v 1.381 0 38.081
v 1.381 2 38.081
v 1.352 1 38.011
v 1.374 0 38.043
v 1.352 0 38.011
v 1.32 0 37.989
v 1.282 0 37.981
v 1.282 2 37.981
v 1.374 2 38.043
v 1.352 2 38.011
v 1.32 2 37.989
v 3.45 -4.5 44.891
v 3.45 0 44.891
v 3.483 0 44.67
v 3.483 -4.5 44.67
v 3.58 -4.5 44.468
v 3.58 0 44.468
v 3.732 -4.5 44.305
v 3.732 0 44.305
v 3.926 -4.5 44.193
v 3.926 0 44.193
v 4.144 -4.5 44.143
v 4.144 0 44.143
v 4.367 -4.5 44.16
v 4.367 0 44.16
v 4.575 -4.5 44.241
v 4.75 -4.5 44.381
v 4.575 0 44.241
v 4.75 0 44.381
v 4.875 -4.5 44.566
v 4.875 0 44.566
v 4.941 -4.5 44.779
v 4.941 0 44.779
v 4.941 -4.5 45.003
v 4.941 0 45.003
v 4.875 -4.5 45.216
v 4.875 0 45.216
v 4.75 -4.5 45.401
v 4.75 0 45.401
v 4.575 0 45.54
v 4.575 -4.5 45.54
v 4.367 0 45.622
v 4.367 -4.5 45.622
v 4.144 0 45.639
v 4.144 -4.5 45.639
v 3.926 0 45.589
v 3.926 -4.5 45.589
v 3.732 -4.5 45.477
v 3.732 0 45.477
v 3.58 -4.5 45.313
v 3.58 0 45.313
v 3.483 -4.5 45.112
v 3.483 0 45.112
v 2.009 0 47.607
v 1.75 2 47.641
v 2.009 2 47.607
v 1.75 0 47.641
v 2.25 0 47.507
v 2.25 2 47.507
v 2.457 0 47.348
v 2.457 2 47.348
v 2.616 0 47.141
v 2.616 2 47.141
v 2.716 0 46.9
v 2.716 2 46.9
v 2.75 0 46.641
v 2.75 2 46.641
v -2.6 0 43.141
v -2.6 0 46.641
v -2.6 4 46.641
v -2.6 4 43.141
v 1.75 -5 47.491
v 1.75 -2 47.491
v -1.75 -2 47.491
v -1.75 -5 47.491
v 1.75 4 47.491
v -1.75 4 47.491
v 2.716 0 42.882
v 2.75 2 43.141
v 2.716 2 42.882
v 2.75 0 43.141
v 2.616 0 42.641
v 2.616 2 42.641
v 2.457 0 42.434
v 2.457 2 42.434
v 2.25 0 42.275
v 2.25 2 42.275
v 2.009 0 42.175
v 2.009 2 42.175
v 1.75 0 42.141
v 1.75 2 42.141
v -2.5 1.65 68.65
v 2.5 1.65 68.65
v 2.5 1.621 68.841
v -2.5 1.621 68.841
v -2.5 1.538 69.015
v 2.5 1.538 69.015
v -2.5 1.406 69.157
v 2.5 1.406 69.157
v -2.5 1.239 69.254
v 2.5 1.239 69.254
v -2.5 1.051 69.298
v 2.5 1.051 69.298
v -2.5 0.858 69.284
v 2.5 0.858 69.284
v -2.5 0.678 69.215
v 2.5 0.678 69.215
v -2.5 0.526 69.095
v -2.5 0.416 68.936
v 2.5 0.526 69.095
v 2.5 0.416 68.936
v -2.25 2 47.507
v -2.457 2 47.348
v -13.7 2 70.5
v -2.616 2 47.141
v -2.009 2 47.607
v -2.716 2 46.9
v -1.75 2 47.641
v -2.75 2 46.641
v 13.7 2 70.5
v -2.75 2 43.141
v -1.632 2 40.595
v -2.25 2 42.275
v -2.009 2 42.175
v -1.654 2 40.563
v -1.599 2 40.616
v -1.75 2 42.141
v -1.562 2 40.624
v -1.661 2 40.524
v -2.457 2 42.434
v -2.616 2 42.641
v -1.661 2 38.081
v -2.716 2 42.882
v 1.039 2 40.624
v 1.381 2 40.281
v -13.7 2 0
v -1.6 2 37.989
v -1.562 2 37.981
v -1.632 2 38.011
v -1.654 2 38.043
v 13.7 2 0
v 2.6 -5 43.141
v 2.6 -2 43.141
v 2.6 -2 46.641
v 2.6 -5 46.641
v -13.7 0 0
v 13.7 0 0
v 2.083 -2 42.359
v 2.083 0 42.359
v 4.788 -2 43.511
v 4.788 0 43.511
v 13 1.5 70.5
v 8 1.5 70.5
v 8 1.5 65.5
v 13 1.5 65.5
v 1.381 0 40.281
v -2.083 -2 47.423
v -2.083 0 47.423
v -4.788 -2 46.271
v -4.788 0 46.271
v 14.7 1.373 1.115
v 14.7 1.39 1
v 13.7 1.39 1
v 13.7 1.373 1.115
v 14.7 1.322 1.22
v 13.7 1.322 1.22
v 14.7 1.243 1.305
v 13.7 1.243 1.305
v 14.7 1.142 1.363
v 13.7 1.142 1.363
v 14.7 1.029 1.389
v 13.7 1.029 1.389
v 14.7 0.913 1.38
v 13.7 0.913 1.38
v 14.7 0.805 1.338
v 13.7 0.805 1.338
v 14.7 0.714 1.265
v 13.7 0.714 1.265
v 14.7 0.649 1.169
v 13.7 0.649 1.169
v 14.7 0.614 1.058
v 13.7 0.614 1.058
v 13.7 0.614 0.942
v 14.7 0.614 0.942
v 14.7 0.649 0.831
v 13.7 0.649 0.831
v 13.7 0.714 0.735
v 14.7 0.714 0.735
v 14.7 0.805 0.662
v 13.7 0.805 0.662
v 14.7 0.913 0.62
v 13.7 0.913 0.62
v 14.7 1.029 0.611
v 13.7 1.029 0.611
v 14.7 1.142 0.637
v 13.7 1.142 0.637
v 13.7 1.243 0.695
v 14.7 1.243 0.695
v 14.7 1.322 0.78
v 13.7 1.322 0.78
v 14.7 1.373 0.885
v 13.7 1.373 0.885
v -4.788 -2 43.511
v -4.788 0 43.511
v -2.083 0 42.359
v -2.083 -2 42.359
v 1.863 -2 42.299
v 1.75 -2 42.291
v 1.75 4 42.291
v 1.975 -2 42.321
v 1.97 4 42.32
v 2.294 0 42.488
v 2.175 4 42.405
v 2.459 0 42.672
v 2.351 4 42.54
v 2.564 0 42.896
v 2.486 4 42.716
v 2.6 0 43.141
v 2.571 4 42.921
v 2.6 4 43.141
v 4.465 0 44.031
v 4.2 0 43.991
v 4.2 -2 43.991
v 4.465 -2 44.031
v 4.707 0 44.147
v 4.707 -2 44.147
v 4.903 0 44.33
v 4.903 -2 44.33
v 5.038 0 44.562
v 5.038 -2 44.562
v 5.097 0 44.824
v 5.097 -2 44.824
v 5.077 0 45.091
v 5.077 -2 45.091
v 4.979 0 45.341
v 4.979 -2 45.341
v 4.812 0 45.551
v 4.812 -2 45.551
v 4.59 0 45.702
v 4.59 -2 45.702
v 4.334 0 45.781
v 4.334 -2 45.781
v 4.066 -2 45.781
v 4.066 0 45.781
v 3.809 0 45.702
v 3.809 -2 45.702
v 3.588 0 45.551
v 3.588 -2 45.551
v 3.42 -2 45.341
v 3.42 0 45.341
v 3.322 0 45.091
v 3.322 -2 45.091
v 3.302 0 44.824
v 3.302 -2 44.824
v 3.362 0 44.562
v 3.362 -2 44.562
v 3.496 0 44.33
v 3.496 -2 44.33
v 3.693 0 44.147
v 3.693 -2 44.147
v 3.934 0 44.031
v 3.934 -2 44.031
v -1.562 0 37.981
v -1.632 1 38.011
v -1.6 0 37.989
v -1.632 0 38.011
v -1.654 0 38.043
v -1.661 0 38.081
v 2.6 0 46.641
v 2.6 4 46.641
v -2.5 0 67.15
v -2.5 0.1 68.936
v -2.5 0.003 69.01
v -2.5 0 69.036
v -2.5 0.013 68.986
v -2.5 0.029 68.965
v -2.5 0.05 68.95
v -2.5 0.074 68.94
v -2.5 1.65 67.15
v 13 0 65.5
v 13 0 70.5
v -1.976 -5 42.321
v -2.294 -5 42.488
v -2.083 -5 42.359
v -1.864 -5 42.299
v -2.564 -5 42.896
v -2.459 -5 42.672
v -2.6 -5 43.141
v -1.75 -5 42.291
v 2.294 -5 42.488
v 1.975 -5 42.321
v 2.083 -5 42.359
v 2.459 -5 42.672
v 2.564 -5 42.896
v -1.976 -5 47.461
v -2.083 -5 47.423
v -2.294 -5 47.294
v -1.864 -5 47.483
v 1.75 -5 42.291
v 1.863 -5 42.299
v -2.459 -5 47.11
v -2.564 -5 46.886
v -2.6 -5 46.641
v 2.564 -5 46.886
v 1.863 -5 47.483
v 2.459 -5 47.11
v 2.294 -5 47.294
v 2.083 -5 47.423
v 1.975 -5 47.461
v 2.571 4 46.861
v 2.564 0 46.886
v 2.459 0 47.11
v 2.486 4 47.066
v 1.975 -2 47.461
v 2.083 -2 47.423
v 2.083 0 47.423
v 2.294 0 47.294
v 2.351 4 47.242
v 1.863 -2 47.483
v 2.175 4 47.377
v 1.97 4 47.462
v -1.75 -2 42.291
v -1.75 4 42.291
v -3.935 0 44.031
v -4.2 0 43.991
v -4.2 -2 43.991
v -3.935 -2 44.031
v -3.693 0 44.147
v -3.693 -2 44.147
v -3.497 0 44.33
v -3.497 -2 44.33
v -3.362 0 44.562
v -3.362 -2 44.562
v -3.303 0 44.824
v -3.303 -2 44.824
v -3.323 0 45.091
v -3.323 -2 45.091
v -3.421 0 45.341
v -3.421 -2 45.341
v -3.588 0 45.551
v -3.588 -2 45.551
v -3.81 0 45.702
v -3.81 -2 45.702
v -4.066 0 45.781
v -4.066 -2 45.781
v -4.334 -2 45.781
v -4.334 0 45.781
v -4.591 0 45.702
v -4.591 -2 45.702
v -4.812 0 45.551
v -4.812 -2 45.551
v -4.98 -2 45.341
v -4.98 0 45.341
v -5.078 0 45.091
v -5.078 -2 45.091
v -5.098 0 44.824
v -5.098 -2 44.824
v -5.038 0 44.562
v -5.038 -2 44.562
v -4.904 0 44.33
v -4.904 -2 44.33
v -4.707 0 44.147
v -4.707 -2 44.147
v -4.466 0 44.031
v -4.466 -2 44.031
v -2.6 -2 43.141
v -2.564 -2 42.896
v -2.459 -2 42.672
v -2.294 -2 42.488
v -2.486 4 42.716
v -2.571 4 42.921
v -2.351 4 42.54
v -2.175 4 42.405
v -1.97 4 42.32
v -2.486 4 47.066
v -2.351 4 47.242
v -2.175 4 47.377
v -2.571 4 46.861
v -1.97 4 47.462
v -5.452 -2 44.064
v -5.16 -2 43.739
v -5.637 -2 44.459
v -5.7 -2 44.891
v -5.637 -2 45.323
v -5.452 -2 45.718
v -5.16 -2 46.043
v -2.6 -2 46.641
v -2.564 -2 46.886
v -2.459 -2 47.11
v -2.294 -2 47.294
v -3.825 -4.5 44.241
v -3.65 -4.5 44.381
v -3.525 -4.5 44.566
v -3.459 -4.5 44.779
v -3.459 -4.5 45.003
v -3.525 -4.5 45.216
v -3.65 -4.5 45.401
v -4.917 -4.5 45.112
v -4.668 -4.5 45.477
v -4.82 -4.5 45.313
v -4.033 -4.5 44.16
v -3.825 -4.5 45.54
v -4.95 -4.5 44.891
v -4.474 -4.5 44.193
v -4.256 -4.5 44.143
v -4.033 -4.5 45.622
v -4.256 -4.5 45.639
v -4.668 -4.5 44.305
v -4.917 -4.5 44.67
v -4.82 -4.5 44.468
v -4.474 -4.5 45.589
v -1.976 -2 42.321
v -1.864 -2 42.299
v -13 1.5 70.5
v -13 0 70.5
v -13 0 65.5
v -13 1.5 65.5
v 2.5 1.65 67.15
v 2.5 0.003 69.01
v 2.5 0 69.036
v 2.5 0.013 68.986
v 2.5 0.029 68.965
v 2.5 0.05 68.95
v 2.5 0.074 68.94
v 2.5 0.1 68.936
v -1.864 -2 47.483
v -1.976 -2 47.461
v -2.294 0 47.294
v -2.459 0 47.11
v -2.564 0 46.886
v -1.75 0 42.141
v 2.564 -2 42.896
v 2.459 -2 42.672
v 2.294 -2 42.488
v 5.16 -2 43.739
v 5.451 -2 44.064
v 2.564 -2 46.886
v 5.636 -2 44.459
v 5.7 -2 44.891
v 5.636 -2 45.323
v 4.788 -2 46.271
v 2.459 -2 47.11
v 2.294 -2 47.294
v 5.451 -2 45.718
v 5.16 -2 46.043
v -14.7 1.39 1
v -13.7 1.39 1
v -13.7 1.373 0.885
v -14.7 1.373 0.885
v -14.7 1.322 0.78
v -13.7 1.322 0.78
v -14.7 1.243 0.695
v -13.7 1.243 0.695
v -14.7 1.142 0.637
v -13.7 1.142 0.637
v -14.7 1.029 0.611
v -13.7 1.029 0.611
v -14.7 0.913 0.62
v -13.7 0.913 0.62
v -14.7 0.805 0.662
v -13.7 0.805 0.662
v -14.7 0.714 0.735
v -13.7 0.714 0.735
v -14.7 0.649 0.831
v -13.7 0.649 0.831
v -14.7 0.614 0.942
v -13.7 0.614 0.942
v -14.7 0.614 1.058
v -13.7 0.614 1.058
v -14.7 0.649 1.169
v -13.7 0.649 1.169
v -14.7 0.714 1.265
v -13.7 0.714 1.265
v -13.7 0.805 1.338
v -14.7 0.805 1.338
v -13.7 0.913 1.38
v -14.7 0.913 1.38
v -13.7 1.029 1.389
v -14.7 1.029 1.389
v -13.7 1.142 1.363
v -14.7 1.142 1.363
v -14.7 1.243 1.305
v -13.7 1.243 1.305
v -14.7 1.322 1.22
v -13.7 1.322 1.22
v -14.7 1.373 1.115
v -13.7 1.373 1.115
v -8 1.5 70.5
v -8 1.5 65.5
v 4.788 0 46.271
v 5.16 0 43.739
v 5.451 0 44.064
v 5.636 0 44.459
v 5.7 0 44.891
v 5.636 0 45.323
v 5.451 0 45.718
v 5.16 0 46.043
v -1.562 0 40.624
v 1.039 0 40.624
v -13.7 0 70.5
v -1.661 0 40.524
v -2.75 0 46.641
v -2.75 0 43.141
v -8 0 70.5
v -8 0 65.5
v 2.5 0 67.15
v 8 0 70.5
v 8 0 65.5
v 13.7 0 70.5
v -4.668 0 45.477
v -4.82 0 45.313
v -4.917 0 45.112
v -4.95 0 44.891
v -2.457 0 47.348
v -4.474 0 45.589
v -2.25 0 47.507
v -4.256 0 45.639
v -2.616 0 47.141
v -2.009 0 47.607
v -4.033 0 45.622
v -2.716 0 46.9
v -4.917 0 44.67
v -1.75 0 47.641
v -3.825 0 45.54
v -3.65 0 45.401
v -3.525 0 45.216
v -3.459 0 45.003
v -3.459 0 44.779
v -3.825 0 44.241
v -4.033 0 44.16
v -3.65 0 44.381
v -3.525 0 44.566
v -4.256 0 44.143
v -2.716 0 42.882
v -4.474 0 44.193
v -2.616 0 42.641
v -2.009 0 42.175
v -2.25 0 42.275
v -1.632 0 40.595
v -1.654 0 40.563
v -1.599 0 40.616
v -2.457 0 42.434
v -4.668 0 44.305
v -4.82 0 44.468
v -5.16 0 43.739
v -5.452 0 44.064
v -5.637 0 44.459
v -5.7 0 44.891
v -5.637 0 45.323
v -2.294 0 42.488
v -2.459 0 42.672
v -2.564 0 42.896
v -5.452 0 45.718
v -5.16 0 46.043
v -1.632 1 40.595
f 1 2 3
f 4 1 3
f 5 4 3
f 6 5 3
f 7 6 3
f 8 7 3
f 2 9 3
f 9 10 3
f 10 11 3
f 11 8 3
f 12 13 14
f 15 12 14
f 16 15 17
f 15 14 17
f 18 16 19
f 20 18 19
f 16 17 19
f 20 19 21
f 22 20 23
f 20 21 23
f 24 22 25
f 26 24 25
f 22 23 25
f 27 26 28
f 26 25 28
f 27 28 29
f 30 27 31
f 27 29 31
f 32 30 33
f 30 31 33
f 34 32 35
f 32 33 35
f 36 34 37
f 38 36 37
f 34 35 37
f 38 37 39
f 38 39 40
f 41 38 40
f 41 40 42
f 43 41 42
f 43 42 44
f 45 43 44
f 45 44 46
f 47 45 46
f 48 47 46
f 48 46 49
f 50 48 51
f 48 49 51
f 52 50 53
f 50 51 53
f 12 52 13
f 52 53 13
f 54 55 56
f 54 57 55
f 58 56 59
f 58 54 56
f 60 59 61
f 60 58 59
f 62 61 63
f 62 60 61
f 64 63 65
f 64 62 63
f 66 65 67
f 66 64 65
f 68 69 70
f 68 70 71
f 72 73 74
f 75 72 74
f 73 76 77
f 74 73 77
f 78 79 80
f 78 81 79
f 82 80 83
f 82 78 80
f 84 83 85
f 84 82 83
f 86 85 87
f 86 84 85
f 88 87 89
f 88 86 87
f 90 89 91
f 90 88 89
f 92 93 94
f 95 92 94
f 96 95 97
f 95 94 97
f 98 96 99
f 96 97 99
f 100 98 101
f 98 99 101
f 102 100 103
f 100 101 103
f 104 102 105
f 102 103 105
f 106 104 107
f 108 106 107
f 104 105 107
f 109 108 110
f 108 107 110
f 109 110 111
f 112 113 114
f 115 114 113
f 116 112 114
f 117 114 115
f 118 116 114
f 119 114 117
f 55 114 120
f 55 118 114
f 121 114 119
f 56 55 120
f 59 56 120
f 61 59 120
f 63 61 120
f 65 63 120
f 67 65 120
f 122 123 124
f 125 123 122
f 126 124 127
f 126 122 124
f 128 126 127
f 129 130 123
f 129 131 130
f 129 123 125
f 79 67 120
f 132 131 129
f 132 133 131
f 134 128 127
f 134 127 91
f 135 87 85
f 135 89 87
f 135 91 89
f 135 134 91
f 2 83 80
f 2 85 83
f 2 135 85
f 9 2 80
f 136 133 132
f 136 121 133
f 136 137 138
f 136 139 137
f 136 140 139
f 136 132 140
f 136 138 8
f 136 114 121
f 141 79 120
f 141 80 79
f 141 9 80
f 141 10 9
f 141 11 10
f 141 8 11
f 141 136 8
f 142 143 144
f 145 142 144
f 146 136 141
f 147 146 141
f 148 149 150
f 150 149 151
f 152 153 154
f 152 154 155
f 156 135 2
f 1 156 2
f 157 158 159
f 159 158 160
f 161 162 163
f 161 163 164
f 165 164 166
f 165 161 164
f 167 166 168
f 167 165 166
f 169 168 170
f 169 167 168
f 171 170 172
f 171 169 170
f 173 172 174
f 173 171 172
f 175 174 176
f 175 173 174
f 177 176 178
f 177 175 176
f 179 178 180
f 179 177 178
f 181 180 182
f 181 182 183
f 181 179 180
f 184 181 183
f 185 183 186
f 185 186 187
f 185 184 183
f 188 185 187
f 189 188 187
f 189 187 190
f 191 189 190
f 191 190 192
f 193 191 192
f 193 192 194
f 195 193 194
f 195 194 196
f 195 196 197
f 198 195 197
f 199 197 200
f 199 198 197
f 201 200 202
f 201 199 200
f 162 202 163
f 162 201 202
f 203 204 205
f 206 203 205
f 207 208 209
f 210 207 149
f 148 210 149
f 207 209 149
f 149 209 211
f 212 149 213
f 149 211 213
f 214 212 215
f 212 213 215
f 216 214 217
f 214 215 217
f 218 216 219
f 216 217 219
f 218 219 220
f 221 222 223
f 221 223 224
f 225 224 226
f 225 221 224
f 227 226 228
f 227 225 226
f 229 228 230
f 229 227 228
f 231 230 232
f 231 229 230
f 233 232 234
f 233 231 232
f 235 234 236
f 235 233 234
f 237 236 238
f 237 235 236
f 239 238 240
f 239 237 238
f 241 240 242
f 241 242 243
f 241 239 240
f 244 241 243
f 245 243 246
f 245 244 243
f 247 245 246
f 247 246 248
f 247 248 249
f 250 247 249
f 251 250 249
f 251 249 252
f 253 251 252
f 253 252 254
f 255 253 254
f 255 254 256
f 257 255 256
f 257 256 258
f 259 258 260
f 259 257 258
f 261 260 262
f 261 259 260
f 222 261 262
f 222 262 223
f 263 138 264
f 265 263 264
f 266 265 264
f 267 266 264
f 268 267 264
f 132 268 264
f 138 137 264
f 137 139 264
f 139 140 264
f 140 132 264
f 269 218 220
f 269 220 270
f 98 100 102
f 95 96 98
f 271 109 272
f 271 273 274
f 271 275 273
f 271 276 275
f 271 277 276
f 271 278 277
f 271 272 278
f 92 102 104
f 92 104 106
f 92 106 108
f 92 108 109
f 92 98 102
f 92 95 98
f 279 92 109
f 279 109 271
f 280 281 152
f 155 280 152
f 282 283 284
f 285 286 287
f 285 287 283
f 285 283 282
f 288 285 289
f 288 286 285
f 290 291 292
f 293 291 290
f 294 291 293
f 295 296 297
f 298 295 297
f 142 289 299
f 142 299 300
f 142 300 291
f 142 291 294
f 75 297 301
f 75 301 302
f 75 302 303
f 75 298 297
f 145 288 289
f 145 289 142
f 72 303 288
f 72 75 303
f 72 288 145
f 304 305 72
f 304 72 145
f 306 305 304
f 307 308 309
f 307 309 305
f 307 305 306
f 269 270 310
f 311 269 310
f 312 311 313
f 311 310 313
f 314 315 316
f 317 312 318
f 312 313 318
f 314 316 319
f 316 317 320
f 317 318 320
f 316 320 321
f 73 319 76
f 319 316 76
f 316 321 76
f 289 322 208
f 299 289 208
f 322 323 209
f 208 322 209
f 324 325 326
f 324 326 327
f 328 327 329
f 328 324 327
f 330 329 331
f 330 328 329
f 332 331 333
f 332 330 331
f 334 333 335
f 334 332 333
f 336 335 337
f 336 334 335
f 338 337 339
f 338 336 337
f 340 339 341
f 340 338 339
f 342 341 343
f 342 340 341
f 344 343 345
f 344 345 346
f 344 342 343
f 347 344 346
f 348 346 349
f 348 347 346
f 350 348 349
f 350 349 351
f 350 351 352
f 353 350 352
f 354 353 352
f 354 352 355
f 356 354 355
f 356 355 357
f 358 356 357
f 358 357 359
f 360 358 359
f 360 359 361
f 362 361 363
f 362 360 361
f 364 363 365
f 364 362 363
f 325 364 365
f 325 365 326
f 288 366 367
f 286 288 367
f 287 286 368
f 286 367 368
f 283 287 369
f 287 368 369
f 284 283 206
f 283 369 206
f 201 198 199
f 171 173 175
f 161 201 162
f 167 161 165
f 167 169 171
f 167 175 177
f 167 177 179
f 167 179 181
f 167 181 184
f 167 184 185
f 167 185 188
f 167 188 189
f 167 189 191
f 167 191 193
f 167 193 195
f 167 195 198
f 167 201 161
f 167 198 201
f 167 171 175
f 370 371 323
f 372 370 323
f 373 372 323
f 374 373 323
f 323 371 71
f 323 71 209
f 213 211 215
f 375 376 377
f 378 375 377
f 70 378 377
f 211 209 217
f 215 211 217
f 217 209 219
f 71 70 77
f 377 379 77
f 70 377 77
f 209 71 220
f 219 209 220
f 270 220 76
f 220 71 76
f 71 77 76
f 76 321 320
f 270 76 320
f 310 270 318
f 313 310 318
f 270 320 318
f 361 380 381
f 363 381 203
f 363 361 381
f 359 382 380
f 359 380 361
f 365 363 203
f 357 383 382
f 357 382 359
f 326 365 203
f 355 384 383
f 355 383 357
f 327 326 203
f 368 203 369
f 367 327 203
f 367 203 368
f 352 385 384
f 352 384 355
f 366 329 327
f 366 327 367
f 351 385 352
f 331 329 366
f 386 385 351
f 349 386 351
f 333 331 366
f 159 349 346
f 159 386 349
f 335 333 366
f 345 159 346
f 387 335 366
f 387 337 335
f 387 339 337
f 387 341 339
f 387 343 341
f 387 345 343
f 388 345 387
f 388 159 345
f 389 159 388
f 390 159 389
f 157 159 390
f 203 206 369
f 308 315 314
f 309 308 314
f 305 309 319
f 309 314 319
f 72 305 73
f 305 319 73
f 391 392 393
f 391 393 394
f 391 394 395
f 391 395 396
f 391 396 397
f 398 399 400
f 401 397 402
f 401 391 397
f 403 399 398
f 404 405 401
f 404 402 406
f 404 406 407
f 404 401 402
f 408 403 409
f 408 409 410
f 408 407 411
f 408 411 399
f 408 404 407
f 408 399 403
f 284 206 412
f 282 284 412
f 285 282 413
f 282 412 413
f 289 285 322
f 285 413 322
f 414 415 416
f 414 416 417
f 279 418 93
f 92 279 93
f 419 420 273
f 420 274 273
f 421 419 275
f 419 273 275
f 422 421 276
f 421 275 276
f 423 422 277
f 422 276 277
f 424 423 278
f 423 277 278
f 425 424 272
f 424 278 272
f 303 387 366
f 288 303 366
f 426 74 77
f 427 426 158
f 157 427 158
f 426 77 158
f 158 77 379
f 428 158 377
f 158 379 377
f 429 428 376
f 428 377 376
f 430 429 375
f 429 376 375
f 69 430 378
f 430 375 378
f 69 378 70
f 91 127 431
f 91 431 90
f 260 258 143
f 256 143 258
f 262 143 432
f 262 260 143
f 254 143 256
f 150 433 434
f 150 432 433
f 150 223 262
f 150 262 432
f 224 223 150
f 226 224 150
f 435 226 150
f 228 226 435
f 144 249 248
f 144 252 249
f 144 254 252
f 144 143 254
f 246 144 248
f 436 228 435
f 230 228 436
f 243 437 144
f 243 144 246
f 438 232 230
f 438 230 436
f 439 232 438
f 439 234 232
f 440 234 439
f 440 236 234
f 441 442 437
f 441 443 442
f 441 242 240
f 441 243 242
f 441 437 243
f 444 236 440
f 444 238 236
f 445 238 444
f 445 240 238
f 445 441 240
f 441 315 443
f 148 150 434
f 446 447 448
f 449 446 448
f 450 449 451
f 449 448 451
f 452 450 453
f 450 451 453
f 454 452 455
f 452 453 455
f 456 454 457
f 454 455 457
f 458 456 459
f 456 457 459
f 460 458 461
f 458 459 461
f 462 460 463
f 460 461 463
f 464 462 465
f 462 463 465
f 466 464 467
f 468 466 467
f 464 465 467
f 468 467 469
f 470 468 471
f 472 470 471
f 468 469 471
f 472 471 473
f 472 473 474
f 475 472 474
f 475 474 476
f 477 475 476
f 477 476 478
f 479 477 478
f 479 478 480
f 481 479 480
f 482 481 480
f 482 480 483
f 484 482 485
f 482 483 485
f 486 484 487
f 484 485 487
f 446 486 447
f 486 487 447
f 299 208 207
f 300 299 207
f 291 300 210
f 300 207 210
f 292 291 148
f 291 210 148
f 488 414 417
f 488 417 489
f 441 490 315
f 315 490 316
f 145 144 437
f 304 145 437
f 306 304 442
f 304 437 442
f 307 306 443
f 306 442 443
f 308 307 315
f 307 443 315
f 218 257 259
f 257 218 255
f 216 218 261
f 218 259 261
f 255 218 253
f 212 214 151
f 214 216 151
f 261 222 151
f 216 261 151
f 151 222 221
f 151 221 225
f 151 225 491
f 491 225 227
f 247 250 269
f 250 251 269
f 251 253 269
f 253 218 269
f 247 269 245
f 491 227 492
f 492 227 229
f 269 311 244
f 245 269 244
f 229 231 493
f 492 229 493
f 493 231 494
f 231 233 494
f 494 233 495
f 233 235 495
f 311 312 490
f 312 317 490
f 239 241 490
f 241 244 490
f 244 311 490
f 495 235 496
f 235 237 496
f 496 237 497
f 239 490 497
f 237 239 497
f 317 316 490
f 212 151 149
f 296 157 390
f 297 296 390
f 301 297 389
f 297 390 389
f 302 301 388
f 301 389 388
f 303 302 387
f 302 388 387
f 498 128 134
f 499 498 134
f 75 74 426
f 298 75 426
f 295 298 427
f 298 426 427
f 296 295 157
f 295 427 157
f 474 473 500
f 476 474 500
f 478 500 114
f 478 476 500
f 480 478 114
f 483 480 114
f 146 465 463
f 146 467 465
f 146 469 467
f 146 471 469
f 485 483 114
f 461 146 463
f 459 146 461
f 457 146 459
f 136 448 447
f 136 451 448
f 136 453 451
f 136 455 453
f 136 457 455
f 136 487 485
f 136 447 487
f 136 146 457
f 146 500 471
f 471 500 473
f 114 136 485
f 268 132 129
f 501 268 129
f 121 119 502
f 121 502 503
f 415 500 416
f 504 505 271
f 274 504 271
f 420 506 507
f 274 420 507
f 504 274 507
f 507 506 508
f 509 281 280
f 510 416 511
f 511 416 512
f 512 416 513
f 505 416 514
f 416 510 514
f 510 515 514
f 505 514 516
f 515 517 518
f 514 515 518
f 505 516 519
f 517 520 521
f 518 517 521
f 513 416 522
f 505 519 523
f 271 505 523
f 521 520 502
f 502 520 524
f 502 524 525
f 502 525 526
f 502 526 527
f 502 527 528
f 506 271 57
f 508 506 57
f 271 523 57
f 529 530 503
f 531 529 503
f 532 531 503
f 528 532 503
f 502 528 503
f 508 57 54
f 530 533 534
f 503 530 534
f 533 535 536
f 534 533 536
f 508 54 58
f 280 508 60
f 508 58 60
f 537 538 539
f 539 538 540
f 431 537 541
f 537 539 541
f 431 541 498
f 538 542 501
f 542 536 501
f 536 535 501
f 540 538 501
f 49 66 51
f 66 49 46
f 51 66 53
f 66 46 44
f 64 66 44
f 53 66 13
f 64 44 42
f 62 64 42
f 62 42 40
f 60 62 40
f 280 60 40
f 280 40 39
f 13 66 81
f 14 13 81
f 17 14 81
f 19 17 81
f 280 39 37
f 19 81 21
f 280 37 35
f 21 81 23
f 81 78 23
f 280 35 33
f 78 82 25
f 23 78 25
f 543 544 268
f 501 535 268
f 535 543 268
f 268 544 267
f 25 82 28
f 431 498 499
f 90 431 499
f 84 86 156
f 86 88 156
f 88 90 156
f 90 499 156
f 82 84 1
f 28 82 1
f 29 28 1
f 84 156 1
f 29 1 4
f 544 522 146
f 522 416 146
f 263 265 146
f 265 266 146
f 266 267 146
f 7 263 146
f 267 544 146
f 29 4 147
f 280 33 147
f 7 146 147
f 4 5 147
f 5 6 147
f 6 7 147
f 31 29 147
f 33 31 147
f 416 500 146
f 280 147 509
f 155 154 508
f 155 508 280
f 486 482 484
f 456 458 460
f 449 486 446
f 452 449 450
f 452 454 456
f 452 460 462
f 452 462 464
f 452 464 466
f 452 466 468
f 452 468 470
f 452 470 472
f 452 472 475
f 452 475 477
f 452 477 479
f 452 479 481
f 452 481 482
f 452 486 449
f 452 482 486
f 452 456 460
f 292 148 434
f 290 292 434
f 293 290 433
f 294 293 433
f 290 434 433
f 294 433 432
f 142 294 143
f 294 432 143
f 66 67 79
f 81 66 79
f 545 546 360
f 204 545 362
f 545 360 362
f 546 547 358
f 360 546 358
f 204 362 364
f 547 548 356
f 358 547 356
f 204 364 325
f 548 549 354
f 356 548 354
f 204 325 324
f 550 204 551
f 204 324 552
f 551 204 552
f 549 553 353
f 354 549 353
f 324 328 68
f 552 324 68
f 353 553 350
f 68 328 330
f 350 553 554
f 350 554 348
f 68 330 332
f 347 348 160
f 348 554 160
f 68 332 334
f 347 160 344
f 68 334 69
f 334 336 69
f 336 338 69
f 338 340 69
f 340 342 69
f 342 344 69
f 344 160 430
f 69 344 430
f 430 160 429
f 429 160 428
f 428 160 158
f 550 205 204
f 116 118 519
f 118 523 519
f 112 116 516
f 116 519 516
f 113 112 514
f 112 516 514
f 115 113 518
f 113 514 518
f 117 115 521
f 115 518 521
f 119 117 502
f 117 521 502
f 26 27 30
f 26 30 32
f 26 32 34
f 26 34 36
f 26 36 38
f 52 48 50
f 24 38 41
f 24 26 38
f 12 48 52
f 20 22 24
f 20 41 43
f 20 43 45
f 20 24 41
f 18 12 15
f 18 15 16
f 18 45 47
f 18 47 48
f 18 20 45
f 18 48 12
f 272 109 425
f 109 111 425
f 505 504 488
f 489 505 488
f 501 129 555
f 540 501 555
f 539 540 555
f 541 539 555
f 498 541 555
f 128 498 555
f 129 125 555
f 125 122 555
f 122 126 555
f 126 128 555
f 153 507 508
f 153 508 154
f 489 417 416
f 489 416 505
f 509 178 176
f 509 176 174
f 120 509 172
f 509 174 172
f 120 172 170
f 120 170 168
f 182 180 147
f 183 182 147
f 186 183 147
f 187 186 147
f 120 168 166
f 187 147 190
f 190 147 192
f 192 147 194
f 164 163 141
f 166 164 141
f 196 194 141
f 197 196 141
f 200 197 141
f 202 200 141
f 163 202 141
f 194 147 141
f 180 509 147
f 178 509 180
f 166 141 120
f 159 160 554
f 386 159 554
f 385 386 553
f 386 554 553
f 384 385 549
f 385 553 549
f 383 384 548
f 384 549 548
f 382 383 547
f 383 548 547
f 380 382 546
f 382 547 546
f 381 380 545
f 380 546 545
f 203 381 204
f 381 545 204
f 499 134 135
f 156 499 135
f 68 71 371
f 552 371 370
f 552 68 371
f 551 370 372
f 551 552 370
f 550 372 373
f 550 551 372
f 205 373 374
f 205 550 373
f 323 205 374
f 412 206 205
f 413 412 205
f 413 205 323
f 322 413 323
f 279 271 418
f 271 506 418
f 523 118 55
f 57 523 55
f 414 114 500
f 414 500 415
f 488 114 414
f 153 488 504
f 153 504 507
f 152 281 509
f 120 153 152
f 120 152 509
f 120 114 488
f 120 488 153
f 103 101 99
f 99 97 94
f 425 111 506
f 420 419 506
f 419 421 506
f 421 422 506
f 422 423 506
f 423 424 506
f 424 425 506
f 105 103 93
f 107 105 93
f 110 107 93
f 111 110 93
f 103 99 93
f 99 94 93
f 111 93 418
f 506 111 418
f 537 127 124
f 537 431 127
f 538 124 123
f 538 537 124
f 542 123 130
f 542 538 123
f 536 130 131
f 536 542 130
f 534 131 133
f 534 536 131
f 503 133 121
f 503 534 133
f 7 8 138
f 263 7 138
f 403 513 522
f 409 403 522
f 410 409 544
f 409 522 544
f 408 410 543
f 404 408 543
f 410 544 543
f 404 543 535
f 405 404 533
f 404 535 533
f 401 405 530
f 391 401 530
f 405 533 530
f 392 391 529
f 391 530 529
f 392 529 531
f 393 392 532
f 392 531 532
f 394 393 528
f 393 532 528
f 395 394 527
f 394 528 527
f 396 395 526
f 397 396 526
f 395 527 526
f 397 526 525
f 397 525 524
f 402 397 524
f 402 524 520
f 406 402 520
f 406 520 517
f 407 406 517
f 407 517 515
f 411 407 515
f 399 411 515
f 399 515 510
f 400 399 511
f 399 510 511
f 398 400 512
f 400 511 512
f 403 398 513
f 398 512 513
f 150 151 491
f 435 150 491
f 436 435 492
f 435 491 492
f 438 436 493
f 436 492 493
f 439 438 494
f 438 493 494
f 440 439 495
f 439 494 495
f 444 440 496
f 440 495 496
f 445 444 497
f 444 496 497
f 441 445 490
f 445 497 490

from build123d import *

# Parameters (mm, degrees)
SKETCH_1_W          = 27.4
SKETCH_1_H          = 2
EXTRUDE_1_DEPTH     = 70.5
CUT_EXTRUDE_5_DEPTH = 2.5
FILLET_4_R          = 0.1
SKETCH_14_R         = 0.39
EXTRUDE_7_DEPTH     = 1
EXTRUDE_START       = 1
SKETCH_15_R         = 0.39
EXTRUDE_8_DEPTH     = 1
SKETCH_16_W         = 5
SKETCH_16_H         = 1.5
CUT_EXTRUDE_6_DEPTH = 5
SKETCH_4_W          = 5.5
SKETCH_4_H          = 5.5
CUT_EXTRUDE_2_DEPTH = 73.044014325
FILLET_1_R          = 1
EXTRUDE_3_DEPTH     = 4
SKETCH_6_R          = 0.9
EXTRUDE_4_DEPTH     = 2
SKETCH_7_R          = 0.75
EXTRUDE_5_DEPTH     = 4.5
EXTRUDE_START_2     = 2
EXTRUDE_6_DEPTH     = 3
CUT_EXTRUDE_7_DEPTH = 2


with BuildPart() as part:
    # 草图1 → 凸台-拉伸1 (new body)
    with BuildSketch(Plane.XY):
        with Locations((0, 1)):
            Rectangle(SKETCH_1_W, SKETCH_1_H)
    extrude(amount=EXTRUDE_1_DEPTH)

    # 草图13 → 切除-拉伸5 (cut, symmetric)
    with BuildSketch(Plane(origin=(0, 0, 0), x_dir=(0, 0, -1), z_dir=(1, 0, 0))):
        with BuildLine():
            Line((-68.5, 0), (-67.150174859, 0))
            Line((-67.150174859, 0), (-67.150174859, 1.65))
            Line((-67.150174859, 1.65), (-68.65, 1.65))
            ThreePointArc((-68.65, 1.65), (-69.283184792, 1.146891183), (-68.936182348, 0.41639083))
            Line((-68.936182348, 0.41639083), (-68.936182348, 0))
            Line((-68.936182348, 0), (-68.5, 0))
        make_face()
    extrude(amount=CUT_EXTRUDE_5_DEPTH, both=True, mode=Mode.SUBTRACT)

    # 圆角4
    fillet_4_edges = [part.edges().sort_by_distance(p)[0] for p in [
        (0, 0, 68.936182348),
    ]]
    fillet(fillet_4_edges, radius=FILLET_4_R)

    # 草图14 → 凸台-拉伸7 (add)
    with BuildSketch(Plane.ZY.offset(13.7)):
        with Locations(Location((1, 1, 0), (0, 0, 90))):
            Circle(SKETCH_14_R)
    extrude(amount=EXTRUDE_7_DEPTH)

    # 草图15 → 凸台-拉伸8 (add)
    with BuildSketch(Plane(origin=(13.7, 0, 0), x_dir=(0, 0, -1), z_dir=(1, 0, 0)).offset(EXTRUDE_START)):
        with Locations(Location((-1, 1, 0), (0, 0, 90))):
            Circle(SKETCH_15_R)
    extrude(amount=-EXTRUDE_8_DEPTH)

    # 草图16 → 切除-拉伸6 (cut)
    with BuildSketch(Plane.XY.offset(70.5)):
        with Locations((-10.5, 0.75)):
            Rectangle(SKETCH_16_W, SKETCH_16_H)
        with Locations((10.5, 0.75)):
            Rectangle(SKETCH_16_W, SKETCH_16_H)
    extrude(amount=-CUT_EXTRUDE_6_DEPTH, mode=Mode.SUBTRACT)

    # 草图4 → 切除-拉伸2 (cut, through all)
    with BuildSketch(Plane(origin=(0, 2, 0), x_dir=(1, 0, 0), z_dir=(0, 1, 0))):
        with Locations((-0.000254001, -44.890957582)):
            Rectangle(SKETCH_4_W, SKETCH_4_H)
    extrude(amount=-CUT_EXTRUDE_2_DEPTH, mode=Mode.SUBTRACT)

    # 圆角1
    fillet_1_edges = [part.edges().sort_by_distance(p)[0] for p in [
        (2.749745999, 1, 42.140957582),
        (2.749745999, 1, 47.640957582),
        (-2.750254001, 1, 47.640957582),
        (-2.750254001, 1, 42.140957582),
    ]]
    fillet(fillet_1_edges, radius=FILLET_1_R)

    # 草图7 → 凸台-拉伸5 (add)
    with BuildSketch(Plane.XZ):
        with Locations(Location((4.199745999, 44.890957582, 0), (0, 0, 180))):
            Circle(SKETCH_7_R)
        with Locations(Location((-4.200254001, 44.890957582, 0), (0, 0, 180))):
            Circle(SKETCH_7_R)
    extrude(amount=EXTRUDE_5_DEPTH)

    # 草图17 → 切除-拉伸7 (cut)
    with BuildSketch(Plane(origin=(0, 2, 0), x_dir=(1, 0, 0), z_dir=(0, 1, 0))):
        with BuildLine():
            Line((1.381293223, -40.281381402), (1.381293223, -38.081000872))
            add(Edge.make_bspline(
                [(1.381293223, -38.081000872), (1.381293223, -37.981381402), (1.281673753, -37.981381402)],
                knots=[5.501585242, 5.501585242, 5.501585242, 7.064785372, 7.064785372, 7.064785372], degree=2, weights=[1, 0.709787336, 1]))
            Line((1.281673753, -37.981381402), (-1.561607713, -37.981381402))
            add(Edge.make_bspline(
                [(-1.561607713, -37.981381402), (-1.661227183, -37.981381402), (-1.661227183, -38.081000872)],
                knots=[5.501585242, 5.501585242, 5.501585242, 7.064785372, 7.064785372, 7.064785372], degree=2, weights=[1, 0.709787336, 1]))
            Line((-1.661227183, -38.081000872), (-1.661227183, -40.524282338))
            add(Edge.make_bspline(
                [(-1.661227183, -40.524282338), (-1.661227183, -40.623901808), (-1.561607713, -40.623901808)],
                knots=[5.501585242, 5.501585242, 5.501585242, 7.064785372, 7.064785372, 7.064785372], degree=2, weights=[1, 0.709787336, 1]))
            Line((-1.561607713, -40.623901808), (1.038772817, -40.623901808))
            Line((1.038772817, -40.623901808), (1.381293223, -40.281381402))
        make_face()
    extrude(amount=-CUT_EXTRUDE_7_DEPTH, mode=Mode.SUBTRACT)


with BuildPart() as body_2:
    # 草图5 → 凸台-拉伸3 (new body)
    with BuildSketch(Plane.XZ):
        with BuildLine():
            Line((-2.600254001, 46.640957582), (-2.600254001, 43.140957582))
            ThreePointArc((-2.600254001, 43.140957582), (-2.351294765, 42.539916818), (-1.750254001, 42.290957582))
            Line((-1.750254001, 42.290957582), (1.749745999, 42.290957582))
            ThreePointArc((1.749745999, 42.290957582), (2.350786764, 42.539916818), (2.599745999, 43.140957582))
            Line((2.599745999, 43.140957582), (2.599745999, 46.640957582))
            ThreePointArc((2.599745999, 46.640957582), (2.350786764, 47.241998346), (1.749745999, 47.490957582))
            Line((1.749745999, 47.490957582), (-1.750254001, 47.490957582))
            ThreePointArc((-1.750254001, 47.490957582), (-2.351294765, 47.241998346), (-2.600254001, 46.640957582))
        make_face()
    extrude(amount=-EXTRUDE_3_DEPTH)

    # 草图6 → 凸台-拉伸4 (add)
    # profile 1 of 3: a face of its own
    with BuildSketch(Plane.XZ):
        with BuildLine():
            ThreePointArc((-2.600254001, 46.640957582), (-2.459343486, 47.109670821), (-2.08333141, 47.422980241))
            Line((-2.08333141, 47.422980241), (-4.788037664, 46.270997568))
            ThreePointArc((-4.788037664, 46.270997568), (-5.700254001, 44.890957582), (-4.788037664, 43.510917595))
            Line((-4.788037664, 43.510917595), (-2.08333141, 42.358934923))
            ThreePointArc((-2.08333141, 42.358934923), (-2.459343486, 42.672244342), (-2.600254001, 43.140957582))
            Line((-2.600254001, 43.140957582), (-2.600254001, 46.640957582))
        make_face()
        with Locations(Location((-4.200254001, 44.890957582, 0), (0, 0, 270))):
            Circle(SKETCH_6_R, mode=Mode.SUBTRACT)
    # profile 2 of 3: a face of its own
    with BuildSketch(Plane.XZ):
        with BuildLine():
            Line((1.749745999, 47.490957582), (-1.750254001, 47.490957582))
            ThreePointArc((-1.750254001, 47.490957582), (-2.351294765, 47.241998346), (-2.600254001, 46.640957582))
            Line((-2.600254001, 46.640957582), (-2.600254001, 43.140957582))
            ThreePointArc((-2.600254001, 43.140957582), (-2.351294765, 42.539916818), (-1.750254001, 42.290957582))
            Line((-1.750254001, 42.290957582), (1.749745999, 42.290957582))
            ThreePointArc((1.749745999, 42.290957582), (2.350786764, 42.539916818), (2.599745999, 43.140957582))
            Line((2.599745999, 43.140957582), (2.599745999, 46.640957582))
            ThreePointArc((2.599745999, 46.640957582), (2.350786764, 47.241998346), (1.749745999, 47.490957582))
        make_face()
    # profile 3 of 3: a face of its own
    with BuildSketch(Plane.XZ):
        with BuildLine():
            Line((4.787529663, 46.270997568), (2.082823409, 47.422980241))
            ThreePointArc((2.082823409, 47.422980241), (2.458835485, 47.109670821), (2.599745999, 46.640957582))
            Line((2.599745999, 46.640957582), (2.599745999, 43.140957582))
            ThreePointArc((2.599745999, 43.140957582), (2.458835485, 42.672244342), (2.082823409, 42.358934923))
            Line((2.082823409, 42.358934923), (4.787529663, 43.510917595))
            ThreePointArc((4.787529663, 43.510917595), (5.699745999, 44.890957582), (4.787529663, 46.270997568))
        make_face()
        with Locations(Location((4.199745999, 44.890957582, 0), (0, 0, 270))):
            Circle(SKETCH_6_R, mode=Mode.SUBTRACT)
    extrude(amount=EXTRUDE_4_DEPTH)

    # 草图6<3> → 凸台-拉伸6 (add)
    with BuildSketch(Plane.XZ.offset(EXTRUDE_START_2)):
        with BuildLine():
            ThreePointArc((-1.750254001, 47.490957582), (-1.920225674, 47.473789876), (-2.08333141, 47.422980241))
            ThreePointArc((-2.08333141, 47.422980241), (-2.459343486, 47.109670821), (-2.600254001, 46.640957582))
            Line((-2.600254001, 46.640957582), (-2.600254001, 43.140957582))
            ThreePointArc((-2.600254001, 43.140957582), (-2.459343486, 42.672244342), (-2.08333141, 42.358934923))
            ThreePointArc((-2.08333141, 42.358934923), (-1.920225674, 42.308125288), (-1.750254001, 42.290957582))
            Line((-1.750254001, 42.290957582), (1.749745999, 42.290957582))
            ThreePointArc((1.749745999, 42.290957582), (1.919717673, 42.308125288), (2.082823409, 42.358934923))
            ThreePointArc((2.082823409, 42.358934923), (2.458835485, 42.672244342), (2.599745999, 43.140957582))
            Line((2.599745999, 43.140957582), (2.599745999, 46.640957582))
            ThreePointArc((2.599745999, 46.640957582), (2.458835485, 47.109670821), (2.082823409, 47.422980241))
            ThreePointArc((2.082823409, 47.422980241), (1.919717673, 47.473789876), (1.749745999, 47.490957582))
            Line((1.749745999, 47.490957582), (-1.750254001, 47.490957582))
        make_face()
    extrude(amount=EXTRUDE_6_DEPTH)


solid = Compound([part.part, body_2.part])
